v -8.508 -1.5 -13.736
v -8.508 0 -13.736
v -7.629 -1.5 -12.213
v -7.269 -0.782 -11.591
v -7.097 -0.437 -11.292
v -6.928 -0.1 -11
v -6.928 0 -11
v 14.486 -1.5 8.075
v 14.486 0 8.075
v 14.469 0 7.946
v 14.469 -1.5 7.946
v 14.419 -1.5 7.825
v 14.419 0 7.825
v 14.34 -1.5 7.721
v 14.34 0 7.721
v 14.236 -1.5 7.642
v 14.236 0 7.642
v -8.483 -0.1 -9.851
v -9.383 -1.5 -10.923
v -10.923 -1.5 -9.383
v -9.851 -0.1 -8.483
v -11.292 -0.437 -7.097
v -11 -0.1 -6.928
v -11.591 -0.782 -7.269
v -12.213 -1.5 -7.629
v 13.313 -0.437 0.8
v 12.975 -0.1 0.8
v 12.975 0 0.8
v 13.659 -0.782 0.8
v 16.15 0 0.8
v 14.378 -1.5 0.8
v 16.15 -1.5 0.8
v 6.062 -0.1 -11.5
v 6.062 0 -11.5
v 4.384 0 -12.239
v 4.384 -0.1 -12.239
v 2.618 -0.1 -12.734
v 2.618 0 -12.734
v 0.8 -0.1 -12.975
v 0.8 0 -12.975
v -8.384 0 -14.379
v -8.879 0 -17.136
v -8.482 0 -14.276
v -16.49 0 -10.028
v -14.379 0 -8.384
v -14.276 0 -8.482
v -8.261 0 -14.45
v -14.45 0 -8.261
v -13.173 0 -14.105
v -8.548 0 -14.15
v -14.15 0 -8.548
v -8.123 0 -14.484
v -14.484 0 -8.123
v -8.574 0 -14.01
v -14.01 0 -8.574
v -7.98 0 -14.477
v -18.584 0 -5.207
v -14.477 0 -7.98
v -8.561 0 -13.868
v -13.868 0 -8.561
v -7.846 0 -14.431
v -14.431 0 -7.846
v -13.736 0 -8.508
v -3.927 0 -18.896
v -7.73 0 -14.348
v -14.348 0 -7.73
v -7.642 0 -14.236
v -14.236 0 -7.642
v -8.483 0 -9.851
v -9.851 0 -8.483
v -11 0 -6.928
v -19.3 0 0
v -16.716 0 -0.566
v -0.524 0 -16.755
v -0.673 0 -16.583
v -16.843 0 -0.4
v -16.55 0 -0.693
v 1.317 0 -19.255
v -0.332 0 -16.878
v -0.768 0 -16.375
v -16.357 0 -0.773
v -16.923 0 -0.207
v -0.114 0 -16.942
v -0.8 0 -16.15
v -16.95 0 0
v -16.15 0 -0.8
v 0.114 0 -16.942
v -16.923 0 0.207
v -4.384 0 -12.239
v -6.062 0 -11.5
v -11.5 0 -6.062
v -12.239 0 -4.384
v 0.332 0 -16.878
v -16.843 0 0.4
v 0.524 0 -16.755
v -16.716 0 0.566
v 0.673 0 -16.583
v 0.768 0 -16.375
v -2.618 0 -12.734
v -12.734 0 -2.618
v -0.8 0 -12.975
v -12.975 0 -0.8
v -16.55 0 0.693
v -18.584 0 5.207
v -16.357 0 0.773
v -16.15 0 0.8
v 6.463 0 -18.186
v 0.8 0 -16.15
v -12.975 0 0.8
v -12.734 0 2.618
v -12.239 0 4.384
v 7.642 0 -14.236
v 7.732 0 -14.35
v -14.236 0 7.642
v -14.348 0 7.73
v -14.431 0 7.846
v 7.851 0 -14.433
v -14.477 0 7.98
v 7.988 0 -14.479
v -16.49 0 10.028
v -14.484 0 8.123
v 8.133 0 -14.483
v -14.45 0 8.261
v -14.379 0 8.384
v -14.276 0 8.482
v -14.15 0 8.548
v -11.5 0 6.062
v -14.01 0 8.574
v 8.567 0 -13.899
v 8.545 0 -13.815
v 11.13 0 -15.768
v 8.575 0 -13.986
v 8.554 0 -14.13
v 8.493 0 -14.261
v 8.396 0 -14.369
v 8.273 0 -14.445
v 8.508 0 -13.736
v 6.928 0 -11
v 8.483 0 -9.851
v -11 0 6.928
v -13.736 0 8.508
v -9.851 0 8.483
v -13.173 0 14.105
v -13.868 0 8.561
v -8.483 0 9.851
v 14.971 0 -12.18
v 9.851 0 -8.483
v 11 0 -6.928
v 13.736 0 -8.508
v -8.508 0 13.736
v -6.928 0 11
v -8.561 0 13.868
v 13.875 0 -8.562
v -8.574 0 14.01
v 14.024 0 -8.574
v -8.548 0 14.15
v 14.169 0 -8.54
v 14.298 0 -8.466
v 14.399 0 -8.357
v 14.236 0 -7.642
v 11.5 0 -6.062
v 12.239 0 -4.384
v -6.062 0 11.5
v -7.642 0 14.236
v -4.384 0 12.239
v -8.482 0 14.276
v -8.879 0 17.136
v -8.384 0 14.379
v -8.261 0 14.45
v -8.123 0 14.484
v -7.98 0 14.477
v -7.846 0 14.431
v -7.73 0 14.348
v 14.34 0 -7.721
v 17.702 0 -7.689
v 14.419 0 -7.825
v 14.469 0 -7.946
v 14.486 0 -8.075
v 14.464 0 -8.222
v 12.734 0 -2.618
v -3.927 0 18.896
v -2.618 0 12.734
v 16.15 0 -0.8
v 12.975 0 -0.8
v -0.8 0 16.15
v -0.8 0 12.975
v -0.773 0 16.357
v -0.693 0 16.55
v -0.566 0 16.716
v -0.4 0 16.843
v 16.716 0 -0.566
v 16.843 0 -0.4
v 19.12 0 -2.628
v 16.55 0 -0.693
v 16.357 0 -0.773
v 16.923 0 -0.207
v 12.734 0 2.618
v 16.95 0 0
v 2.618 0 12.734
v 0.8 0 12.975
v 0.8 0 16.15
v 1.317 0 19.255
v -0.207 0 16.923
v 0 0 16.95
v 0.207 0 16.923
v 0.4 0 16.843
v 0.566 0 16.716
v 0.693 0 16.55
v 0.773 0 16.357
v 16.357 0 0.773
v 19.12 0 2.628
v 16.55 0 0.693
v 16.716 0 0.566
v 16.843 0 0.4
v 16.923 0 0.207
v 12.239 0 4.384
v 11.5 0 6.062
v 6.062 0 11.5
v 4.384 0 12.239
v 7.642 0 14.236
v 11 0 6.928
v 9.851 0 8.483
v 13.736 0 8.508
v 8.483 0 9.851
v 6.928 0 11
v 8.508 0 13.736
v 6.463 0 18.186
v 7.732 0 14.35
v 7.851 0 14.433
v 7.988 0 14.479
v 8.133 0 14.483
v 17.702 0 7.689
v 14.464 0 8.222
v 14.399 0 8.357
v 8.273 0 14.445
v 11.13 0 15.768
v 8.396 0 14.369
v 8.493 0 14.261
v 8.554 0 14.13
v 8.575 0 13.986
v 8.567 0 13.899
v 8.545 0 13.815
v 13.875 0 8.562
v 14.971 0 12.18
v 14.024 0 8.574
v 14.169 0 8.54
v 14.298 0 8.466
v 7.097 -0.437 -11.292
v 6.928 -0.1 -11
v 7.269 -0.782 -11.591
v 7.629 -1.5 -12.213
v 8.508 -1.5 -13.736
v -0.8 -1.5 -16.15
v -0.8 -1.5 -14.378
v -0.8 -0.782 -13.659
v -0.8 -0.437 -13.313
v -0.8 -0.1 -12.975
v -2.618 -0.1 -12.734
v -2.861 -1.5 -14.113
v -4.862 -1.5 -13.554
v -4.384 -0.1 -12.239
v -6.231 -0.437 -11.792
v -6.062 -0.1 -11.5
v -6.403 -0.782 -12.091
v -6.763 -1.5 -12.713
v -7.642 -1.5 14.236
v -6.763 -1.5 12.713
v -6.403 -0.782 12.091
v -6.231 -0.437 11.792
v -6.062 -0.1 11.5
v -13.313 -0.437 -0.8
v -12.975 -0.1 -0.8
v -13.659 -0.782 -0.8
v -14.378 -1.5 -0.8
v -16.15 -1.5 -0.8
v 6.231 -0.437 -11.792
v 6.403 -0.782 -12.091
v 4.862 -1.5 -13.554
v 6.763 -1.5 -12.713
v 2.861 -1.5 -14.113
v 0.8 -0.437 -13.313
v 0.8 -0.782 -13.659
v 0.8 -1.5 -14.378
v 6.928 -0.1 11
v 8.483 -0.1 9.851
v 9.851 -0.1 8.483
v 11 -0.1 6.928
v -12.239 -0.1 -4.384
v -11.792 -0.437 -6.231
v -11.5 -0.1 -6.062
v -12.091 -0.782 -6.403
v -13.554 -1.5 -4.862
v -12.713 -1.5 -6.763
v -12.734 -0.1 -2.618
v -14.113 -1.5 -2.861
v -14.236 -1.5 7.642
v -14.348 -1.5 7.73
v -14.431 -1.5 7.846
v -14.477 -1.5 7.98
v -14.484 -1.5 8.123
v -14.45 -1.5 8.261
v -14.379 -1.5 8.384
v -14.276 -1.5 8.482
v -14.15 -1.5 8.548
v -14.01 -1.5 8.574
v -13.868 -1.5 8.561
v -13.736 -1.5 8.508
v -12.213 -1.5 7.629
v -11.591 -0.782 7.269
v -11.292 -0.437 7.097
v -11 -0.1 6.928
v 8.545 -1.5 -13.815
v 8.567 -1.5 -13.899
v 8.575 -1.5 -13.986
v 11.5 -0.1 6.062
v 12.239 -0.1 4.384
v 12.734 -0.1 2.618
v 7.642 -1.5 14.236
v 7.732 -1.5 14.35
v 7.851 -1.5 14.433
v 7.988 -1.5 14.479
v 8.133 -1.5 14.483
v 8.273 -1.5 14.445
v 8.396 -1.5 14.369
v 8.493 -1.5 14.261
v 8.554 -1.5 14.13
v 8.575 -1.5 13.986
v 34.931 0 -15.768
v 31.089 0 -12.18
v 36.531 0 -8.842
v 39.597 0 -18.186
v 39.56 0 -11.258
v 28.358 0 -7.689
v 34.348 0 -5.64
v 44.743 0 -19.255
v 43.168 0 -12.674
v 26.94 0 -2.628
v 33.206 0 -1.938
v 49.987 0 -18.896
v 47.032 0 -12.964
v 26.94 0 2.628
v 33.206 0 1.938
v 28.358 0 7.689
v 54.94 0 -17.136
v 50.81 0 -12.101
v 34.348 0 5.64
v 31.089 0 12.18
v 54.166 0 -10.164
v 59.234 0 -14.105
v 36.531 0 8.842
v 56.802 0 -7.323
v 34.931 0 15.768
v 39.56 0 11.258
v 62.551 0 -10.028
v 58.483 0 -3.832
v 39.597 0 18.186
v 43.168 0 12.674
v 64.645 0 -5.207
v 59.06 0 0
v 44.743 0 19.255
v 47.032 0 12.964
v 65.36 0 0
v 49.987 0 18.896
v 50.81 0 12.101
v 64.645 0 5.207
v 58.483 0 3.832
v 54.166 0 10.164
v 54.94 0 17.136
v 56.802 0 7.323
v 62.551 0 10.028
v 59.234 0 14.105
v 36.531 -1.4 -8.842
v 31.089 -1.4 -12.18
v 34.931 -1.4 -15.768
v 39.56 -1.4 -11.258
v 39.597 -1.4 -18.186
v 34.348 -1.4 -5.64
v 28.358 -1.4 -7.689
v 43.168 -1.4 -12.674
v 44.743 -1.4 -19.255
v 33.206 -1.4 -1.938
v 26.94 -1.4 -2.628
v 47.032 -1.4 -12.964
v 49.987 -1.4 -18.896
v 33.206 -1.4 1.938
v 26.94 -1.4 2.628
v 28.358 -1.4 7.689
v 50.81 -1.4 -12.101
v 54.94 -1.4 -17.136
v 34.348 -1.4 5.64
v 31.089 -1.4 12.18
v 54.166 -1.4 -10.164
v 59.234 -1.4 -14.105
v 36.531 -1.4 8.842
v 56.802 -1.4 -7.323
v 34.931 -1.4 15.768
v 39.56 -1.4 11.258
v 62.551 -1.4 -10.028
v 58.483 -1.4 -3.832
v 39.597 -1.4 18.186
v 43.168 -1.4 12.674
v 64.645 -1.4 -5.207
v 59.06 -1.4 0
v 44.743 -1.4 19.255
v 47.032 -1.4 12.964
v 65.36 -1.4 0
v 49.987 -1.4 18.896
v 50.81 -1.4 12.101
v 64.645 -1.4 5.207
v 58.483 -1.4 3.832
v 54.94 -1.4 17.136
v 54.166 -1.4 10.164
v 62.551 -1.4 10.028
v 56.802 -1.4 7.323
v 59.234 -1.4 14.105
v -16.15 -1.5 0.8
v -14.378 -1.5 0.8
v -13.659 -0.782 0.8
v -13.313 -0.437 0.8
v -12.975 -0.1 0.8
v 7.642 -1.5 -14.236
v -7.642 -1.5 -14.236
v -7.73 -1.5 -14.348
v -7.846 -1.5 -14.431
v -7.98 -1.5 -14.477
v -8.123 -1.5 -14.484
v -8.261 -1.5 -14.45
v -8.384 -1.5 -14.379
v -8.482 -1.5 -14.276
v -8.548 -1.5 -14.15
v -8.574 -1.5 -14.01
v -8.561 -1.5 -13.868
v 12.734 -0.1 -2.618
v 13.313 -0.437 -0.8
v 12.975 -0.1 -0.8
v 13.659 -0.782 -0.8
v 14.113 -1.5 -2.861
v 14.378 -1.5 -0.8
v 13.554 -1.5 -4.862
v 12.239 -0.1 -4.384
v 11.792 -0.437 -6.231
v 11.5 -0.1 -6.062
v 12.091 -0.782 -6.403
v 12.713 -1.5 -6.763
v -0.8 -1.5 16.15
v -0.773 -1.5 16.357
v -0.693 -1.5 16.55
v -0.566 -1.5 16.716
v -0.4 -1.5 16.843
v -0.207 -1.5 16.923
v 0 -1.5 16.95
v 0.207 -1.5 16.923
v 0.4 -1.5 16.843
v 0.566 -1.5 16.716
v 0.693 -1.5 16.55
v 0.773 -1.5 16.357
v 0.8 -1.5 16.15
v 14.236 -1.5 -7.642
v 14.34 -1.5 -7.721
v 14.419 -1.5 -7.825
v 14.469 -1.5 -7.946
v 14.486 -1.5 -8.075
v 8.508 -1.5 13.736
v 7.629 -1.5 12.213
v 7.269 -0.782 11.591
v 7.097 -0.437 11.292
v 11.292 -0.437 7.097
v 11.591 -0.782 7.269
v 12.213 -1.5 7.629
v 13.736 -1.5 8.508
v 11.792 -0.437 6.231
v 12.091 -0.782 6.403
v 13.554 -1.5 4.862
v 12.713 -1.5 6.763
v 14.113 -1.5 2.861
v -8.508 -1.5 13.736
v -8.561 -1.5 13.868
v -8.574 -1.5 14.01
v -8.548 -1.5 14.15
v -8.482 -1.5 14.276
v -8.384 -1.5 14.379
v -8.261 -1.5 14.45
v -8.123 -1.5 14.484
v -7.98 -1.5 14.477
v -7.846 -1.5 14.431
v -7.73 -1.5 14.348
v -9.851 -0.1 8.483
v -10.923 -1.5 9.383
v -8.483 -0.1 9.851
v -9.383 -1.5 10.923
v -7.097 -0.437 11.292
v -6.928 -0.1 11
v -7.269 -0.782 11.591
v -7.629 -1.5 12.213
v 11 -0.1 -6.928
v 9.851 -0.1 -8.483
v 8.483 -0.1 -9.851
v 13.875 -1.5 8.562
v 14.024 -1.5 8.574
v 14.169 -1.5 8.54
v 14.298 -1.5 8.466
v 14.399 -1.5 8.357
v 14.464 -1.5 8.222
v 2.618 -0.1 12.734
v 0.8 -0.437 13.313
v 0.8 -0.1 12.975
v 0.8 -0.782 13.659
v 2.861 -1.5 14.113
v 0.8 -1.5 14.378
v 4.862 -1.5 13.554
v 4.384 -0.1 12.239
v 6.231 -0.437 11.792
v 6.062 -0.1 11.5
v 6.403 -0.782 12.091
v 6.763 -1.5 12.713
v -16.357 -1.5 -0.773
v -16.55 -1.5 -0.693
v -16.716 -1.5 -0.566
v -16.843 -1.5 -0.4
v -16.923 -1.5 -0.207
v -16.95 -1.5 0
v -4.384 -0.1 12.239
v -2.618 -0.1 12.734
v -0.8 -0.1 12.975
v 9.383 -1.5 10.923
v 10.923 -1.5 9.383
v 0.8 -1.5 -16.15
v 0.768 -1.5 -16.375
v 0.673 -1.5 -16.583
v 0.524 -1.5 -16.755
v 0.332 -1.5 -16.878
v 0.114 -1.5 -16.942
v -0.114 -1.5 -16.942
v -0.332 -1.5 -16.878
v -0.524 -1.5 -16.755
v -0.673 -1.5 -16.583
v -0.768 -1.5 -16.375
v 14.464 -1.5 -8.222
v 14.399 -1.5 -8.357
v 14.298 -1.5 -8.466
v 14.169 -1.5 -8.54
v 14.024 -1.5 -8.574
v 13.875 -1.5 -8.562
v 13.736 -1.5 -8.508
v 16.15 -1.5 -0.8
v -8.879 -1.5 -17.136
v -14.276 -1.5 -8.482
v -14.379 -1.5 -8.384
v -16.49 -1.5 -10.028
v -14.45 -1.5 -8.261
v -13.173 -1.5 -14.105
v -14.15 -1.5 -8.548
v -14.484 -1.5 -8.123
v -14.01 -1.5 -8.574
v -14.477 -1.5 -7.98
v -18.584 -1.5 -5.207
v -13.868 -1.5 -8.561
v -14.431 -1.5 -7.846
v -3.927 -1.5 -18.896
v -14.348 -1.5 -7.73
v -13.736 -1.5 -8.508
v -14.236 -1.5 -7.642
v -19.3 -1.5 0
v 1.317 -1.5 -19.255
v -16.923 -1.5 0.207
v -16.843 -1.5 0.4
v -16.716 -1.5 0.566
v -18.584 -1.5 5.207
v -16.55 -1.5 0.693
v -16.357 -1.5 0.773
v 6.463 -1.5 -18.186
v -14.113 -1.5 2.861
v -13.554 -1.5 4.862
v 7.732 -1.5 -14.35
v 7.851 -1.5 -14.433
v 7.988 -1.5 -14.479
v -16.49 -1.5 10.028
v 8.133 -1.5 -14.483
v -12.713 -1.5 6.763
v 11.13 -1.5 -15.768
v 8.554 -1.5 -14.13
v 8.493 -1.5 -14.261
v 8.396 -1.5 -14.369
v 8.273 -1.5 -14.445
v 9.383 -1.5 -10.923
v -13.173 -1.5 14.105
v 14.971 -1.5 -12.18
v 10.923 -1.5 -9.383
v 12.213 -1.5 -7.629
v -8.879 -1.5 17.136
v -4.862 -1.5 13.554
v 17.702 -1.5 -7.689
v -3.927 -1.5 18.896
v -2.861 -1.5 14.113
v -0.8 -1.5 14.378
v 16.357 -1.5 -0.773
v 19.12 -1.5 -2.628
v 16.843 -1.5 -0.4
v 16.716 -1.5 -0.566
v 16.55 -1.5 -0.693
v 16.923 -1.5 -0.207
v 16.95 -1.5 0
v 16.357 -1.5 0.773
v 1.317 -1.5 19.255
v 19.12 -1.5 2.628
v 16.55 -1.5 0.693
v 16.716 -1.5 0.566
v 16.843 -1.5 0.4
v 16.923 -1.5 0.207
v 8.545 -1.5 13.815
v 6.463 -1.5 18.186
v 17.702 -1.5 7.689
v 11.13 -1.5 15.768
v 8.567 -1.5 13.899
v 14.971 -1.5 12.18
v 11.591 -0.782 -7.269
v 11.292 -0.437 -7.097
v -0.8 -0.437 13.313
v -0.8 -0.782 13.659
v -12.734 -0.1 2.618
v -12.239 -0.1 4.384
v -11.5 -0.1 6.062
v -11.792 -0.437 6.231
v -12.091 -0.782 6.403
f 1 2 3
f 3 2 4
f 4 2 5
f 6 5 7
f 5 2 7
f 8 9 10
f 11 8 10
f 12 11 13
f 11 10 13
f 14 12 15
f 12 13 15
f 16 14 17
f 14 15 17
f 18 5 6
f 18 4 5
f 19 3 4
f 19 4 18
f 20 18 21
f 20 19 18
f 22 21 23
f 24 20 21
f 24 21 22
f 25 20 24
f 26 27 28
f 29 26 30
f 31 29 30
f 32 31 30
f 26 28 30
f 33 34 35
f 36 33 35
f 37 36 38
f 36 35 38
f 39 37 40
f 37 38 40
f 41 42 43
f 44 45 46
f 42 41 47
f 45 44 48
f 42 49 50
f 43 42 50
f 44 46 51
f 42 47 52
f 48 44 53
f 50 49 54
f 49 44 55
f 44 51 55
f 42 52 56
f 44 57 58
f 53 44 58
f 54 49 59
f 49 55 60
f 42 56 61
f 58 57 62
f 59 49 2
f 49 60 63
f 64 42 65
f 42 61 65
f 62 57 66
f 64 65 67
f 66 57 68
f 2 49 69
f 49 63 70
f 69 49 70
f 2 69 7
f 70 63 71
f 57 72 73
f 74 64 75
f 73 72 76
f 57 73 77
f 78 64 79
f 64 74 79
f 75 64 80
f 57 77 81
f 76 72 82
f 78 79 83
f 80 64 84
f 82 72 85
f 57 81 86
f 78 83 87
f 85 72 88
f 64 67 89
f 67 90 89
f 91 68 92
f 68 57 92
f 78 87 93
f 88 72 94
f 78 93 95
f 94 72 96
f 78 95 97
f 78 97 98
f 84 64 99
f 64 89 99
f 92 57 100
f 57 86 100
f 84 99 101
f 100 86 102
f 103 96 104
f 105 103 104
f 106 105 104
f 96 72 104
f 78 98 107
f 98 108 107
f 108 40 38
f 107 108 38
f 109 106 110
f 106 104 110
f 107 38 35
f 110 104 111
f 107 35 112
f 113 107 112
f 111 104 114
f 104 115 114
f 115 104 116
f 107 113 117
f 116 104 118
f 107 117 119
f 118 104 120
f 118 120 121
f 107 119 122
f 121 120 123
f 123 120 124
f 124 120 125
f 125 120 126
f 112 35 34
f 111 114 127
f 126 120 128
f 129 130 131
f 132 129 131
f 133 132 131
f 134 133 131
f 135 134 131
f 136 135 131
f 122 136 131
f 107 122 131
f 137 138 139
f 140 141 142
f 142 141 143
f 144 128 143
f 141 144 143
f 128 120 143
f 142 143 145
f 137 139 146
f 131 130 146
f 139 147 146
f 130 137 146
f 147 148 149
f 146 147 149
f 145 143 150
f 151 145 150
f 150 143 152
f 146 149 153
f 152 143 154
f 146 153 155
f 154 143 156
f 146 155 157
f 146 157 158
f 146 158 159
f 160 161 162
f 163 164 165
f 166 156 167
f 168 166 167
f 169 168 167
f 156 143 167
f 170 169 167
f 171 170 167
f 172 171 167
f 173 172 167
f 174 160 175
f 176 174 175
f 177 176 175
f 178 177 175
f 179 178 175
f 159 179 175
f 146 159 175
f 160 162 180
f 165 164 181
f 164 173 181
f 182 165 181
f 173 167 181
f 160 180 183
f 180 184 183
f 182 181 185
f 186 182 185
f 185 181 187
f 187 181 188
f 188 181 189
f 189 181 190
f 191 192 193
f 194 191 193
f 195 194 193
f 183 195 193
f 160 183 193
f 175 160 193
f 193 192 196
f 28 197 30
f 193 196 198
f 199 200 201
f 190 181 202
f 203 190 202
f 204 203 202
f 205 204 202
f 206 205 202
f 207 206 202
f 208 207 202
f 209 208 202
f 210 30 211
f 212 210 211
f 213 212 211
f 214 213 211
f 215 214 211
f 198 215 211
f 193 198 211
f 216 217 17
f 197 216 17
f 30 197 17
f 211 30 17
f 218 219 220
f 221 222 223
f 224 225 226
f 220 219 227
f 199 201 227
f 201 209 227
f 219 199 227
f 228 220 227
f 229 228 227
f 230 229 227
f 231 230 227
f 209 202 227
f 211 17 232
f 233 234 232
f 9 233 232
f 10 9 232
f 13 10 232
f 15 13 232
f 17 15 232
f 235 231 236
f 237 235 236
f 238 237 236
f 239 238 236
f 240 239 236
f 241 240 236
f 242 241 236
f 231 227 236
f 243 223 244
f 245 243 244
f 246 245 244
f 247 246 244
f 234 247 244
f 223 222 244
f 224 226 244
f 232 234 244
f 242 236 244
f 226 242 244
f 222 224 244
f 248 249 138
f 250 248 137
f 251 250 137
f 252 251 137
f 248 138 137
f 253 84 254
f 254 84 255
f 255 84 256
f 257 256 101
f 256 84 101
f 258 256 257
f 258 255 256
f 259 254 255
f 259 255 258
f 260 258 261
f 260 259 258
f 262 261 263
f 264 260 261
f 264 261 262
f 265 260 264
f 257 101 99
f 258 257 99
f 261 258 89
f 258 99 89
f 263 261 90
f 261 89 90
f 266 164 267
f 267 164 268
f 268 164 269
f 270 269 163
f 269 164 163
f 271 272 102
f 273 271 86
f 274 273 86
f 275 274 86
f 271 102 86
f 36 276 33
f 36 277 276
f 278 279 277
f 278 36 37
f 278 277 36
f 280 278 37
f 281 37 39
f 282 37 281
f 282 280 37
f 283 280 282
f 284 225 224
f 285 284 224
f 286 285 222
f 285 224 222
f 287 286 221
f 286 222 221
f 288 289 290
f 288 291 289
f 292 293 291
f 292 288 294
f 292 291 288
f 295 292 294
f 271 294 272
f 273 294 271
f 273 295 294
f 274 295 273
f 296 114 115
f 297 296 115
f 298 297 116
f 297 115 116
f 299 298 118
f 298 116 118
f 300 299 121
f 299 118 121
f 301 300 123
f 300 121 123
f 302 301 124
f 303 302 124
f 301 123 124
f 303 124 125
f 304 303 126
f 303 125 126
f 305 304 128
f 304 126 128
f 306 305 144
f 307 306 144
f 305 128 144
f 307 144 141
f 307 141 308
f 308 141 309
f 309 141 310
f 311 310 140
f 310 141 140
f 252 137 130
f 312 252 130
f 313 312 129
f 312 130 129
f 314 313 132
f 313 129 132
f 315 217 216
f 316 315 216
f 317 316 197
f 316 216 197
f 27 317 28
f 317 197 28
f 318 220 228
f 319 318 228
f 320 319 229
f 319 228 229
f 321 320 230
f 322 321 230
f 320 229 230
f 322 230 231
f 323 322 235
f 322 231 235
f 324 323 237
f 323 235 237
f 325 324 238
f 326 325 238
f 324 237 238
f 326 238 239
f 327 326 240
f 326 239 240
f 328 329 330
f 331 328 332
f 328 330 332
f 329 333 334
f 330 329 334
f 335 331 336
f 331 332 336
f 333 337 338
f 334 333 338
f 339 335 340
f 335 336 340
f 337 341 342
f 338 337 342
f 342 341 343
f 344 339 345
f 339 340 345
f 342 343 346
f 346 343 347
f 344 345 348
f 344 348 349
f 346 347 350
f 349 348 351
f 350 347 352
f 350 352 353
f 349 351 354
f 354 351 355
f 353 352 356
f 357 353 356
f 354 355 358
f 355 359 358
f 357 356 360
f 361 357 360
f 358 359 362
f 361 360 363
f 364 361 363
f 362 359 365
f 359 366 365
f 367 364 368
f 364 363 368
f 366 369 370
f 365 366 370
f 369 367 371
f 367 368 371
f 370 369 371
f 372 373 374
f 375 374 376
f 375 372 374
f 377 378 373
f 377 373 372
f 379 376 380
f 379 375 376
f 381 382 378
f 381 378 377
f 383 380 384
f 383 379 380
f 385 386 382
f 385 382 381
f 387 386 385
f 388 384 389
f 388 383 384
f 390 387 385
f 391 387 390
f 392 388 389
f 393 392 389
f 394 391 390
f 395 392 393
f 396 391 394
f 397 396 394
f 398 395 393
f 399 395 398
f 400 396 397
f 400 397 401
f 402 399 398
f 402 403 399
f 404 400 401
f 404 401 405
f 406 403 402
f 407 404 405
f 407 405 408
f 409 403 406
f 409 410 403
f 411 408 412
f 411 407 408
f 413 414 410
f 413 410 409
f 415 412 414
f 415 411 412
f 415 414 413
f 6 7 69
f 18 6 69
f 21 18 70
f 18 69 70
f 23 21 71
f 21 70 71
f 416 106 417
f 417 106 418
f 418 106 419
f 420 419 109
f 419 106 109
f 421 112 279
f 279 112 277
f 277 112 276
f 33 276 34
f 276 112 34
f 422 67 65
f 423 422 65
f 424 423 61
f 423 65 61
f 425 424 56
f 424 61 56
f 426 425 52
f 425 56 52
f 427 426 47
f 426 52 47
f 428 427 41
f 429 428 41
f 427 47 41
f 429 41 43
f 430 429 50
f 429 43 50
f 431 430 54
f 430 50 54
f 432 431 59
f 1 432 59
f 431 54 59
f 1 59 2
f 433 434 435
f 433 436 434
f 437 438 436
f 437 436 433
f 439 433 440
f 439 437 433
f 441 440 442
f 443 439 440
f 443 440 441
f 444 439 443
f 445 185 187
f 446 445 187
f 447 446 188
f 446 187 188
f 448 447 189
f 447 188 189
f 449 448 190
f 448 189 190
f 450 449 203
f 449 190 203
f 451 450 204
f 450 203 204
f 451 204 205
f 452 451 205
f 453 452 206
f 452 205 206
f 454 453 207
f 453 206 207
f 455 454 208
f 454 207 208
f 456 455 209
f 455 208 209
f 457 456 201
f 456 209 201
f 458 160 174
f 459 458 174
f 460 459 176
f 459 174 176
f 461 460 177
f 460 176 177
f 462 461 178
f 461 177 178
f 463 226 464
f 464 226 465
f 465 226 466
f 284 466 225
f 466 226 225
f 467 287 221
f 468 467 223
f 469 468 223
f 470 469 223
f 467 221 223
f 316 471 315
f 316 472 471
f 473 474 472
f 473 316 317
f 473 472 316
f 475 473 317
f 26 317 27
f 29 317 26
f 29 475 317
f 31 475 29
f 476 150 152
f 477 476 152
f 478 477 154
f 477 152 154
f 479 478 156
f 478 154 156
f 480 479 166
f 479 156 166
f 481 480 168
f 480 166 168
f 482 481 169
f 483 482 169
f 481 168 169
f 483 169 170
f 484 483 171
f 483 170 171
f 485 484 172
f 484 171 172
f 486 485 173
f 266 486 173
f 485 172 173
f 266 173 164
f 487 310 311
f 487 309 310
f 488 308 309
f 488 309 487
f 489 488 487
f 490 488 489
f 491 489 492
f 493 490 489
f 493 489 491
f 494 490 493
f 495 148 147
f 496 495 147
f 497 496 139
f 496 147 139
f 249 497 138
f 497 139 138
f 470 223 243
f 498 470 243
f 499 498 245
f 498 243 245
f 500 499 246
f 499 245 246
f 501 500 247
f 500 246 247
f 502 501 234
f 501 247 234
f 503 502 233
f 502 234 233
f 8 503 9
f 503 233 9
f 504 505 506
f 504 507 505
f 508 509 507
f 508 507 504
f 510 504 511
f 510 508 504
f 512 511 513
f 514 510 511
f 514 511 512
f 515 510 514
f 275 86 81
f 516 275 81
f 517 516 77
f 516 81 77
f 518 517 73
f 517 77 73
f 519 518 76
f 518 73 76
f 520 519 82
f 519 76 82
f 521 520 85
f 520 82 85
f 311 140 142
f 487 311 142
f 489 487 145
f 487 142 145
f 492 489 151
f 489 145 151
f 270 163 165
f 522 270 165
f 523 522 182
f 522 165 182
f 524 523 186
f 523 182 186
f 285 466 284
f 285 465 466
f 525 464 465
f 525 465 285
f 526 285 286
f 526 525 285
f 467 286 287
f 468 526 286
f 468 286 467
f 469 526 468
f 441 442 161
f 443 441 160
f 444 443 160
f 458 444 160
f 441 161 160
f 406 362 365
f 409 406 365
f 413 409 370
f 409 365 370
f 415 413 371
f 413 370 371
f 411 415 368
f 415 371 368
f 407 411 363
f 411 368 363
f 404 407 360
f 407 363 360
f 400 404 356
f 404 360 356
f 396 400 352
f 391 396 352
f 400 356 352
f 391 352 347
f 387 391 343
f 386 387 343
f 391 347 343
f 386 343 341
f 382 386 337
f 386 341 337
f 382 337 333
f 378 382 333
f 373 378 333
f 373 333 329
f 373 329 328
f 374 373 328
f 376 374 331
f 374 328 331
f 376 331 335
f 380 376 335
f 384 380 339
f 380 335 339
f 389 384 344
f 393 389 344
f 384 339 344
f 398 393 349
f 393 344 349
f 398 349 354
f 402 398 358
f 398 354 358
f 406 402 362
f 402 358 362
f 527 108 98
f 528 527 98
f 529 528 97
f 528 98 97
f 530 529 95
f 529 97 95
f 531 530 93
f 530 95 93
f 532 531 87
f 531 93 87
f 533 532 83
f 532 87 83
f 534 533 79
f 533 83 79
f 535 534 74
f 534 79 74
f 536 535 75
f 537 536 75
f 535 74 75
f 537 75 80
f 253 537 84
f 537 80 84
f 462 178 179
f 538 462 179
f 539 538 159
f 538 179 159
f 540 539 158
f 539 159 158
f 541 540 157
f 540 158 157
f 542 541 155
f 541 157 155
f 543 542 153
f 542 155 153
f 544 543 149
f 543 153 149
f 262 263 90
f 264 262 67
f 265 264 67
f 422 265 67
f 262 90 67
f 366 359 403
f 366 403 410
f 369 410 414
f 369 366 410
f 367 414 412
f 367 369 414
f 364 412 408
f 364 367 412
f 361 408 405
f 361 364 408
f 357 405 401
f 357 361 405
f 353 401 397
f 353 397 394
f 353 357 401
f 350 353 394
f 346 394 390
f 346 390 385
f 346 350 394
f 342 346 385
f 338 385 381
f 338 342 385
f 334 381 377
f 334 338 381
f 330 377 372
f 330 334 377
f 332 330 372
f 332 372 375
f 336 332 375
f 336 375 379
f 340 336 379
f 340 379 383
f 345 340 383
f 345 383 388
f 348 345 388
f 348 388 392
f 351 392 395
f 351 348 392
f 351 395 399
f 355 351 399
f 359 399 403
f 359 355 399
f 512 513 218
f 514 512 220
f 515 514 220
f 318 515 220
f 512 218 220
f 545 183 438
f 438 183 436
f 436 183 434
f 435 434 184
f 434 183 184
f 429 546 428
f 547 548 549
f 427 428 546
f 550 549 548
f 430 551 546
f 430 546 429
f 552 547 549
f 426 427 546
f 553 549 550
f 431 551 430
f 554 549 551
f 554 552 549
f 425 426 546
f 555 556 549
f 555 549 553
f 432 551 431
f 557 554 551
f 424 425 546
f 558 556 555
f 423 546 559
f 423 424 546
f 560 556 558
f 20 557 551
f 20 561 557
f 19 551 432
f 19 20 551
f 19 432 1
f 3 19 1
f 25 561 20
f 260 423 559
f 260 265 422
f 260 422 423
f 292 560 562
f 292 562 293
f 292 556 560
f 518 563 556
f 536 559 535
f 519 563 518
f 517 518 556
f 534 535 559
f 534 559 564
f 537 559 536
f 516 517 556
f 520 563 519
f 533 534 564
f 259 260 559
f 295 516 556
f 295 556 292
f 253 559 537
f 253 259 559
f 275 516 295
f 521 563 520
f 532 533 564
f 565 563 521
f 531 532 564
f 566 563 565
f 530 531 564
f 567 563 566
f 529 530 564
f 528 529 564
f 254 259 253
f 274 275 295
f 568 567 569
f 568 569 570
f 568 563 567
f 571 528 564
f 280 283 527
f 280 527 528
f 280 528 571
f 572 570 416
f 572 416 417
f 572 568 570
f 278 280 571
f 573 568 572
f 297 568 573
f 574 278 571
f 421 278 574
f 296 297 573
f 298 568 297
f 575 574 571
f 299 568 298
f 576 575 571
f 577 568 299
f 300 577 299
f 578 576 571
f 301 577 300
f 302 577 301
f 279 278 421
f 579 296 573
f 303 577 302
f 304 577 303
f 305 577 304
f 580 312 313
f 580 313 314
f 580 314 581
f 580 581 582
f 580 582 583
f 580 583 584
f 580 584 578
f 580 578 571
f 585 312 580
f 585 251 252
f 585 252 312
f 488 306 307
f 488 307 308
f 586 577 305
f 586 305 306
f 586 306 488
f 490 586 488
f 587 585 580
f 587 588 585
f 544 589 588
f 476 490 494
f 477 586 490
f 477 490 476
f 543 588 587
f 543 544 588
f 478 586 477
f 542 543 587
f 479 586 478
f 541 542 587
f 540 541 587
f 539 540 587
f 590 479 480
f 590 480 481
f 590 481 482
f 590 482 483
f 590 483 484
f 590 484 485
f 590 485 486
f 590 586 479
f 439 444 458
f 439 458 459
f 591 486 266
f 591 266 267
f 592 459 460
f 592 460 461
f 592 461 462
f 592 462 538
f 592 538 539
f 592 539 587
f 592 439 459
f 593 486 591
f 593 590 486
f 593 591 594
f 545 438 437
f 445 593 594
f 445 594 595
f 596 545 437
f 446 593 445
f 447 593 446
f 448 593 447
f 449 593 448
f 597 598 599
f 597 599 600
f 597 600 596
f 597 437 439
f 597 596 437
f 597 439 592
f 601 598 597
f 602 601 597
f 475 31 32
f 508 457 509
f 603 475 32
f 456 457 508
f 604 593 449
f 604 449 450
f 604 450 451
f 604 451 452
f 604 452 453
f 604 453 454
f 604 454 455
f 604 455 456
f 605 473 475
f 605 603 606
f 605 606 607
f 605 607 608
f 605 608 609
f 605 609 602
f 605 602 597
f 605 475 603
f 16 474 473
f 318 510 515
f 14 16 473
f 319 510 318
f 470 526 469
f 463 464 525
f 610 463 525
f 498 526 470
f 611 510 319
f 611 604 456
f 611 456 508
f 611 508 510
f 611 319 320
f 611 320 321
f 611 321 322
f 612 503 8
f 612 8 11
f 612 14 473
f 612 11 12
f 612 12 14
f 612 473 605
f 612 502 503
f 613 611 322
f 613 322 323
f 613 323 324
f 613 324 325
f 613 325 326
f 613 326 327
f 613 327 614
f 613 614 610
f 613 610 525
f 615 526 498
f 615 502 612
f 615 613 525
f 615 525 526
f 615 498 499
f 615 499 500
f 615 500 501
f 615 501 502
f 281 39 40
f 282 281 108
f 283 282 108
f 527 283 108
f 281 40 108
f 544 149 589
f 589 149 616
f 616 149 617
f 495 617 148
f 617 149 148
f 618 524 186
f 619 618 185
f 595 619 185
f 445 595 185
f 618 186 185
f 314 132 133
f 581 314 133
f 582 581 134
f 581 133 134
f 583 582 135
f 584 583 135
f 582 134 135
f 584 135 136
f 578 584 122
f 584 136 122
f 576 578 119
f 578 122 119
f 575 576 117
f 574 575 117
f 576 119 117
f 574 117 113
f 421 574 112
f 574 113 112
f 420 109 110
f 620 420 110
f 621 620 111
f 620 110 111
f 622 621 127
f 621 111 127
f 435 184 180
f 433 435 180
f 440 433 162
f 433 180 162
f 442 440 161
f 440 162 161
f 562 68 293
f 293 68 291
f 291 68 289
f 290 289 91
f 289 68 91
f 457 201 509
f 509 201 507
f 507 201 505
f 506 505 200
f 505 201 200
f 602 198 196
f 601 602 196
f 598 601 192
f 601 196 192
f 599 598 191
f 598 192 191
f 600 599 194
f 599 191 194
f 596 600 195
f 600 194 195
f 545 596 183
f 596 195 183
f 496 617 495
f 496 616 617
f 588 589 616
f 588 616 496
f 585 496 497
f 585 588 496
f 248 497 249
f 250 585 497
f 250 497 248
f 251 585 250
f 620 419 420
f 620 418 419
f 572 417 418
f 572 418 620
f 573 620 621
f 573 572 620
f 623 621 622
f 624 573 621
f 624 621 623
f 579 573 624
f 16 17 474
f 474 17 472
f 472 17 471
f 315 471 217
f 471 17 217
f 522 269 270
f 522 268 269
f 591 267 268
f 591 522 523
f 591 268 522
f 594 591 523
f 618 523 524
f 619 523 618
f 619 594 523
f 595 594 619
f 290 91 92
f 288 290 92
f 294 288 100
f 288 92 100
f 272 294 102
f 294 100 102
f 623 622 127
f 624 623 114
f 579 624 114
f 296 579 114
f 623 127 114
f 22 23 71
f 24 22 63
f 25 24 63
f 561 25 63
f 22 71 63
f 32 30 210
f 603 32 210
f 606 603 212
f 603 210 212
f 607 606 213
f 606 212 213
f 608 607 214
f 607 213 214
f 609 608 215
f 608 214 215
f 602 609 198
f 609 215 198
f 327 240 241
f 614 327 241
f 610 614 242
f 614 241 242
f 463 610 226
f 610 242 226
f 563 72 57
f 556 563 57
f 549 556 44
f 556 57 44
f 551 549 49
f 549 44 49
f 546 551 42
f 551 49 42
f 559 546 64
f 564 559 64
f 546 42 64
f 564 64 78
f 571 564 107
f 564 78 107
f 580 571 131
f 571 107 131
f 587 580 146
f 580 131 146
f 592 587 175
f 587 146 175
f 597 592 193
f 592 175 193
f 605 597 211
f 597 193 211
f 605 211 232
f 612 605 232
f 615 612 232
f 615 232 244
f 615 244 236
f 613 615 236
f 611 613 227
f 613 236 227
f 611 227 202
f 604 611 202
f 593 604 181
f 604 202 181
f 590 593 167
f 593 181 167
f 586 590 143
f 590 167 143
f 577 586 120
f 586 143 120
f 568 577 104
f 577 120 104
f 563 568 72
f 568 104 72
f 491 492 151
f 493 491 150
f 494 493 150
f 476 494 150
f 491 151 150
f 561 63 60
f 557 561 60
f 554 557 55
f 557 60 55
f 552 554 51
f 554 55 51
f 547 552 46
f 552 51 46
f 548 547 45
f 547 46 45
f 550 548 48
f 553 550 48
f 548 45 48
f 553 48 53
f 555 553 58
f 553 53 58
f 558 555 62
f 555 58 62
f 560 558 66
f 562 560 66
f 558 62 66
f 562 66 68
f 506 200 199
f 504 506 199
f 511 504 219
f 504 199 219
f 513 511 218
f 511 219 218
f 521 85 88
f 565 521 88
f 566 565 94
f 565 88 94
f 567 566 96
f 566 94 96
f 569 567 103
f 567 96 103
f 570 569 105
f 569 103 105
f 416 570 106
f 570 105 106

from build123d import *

# Parameters (mm, degrees)
F1_DEPTH = 1.5
F2_SIZE  = 1.4
F0_R     = 19.3
F0_R_2   = 13
F3_DEPTH = 1.4


with BuildPart() as f1:
    # F0 (on Front) → F1 (new body)
    with BuildSketch(Plane.XZ):
        with BuildLine():
            Line((0, 16.95), (0, 19.3))
            ThreePointArc((0, 19.3), (-13.6471608769, 13.6471608769), (-19.3, 0))
            Line((-19.3, 0), (-16.95, 0))
            ThreePointArc((-16.95, 0), (-16.7156854249, 0.5656854249), (-16.15, 0.8))
            Line((-16.15, 0.8), (-12.9753612666, 0.8))
            ThreePointArc((-12.9753612666, 0.8), (-12.5173262382, 3.509493389), (-11.5, 6.0621778265))
            Line((-11.5, 6.0621778265), (-14.2363102711, 7.6419872981))
            ThreePointArc((-14.2363102711, 7.6419872981), (-14.419322973, 8.325), (-13.7363102711, 8.5080127019))
            Line((-13.7363102711, 8.5080127019), (-11, 6.9282032303))
            ThreePointArc((-11, 6.9282032303), (-9.1923881554, 9.1923881554), (-6.9282032303, 11))
            Line((-6.9282032303, 11), (-8.5080127019, 13.7363102711))
            ThreePointArc((-8.5080127019, 13.7363102711), (-8.325, 14.419322973), (-7.6419872981, 14.2363102711))
            Line((-7.6419872981, 14.2363102711), (-6.0621778265, 11.5))
            ThreePointArc((-6.0621778265, 11.5), (-3.509493389, 12.5173262382), (-0.8, 12.9753612666))
            Line((-0.8, 12.9753612666), (-0.8, 16.15))
            ThreePointArc((-0.8, 16.15), (-0.5656854249, 16.7156854249), (0, 16.95))
        make_face()
        with BuildLine():
            ThreePointArc((-19.3, 0), (0, -19.3), (19.3, 0))
            ThreePointArc((19.3, 0), (13.6471608769, 13.6471608769), (0, 19.3))
            Line((0, 19.3), (0, 16.95))
            ThreePointArc((0, 16.95), (0.5656854249, 16.7156854249), (0.8, 16.15))
            Line((0.8, 16.15), (0.8, 12.9753612666))
            ThreePointArc((0.8, 12.9753612666), (3.509493389, 12.5173262382), (6.0621778265, 11.5))
            Line((6.0621778265, 11.5), (7.6419872981, 14.2363102711))
            ThreePointArc((7.6419872981, 14.2363102711), (8.2044095226, 14.4692731843), (8.575, 13.9863102711))
            ThreePointArc((8.575, 13.9863102711), (8.5579629131, 13.8569007486), (8.5080127019, 13.7363102711))
            Line((8.5080127019, 13.7363102711), (6.9282032303, 11))
            ThreePointArc((6.9282032303, 11), (9.1923881554, 9.1923881554), (11, 6.9282032303))
            Line((11, 6.9282032303), (13.7363102711, 8.5080127019))
            ThreePointArc((13.7363102711, 8.5080127019), (14.2363102711, 8.5080127019), (14.4863102711, 8.075))
            ThreePointArc((14.4863102711, 8.075), (14.419322973, 7.825), (14.2363102711, 7.6419872981))
            Line((14.2363102711, 7.6419872981), (11.5, 6.0621778265))
            ThreePointArc((11.5, 6.0621778265), (12.5173262382, 3.509493389), (12.9753612666, 0.8))
            Line((12.9753612666, 0.8), (16.15, 0.8))
            ThreePointArc((16.15, 0.8), (16.7156854249, 0.5656854249), (16.95, 0))
            ThreePointArc((16.95, 0), (16.7156854249, -0.5656854249), (16.15, -0.8))
            Line((16.15, -0.8), (12.9753612666, -0.8))
            ThreePointArc((12.9753612666, -0.8), (12.5173262382, -3.509493389), (11.5, -6.0621778265))
            Line((11.5, -6.0621778265), (14.2363102711, -7.6419872981))
            ThreePointArc((14.2363102711, -7.6419872981), (14.419322973, -7.825), (14.4863102711, -8.075))
            ThreePointArc((14.4863102711, -8.075), (14.2363102711, -8.5080127019), (13.7363102711, -8.5080127019))
            Line((13.7363102711, -8.5080127019), (11, -6.9282032303))
            ThreePointArc((11, -6.9282032303), (9.1923881554, -9.1923881554), (6.9282032303, -11))
            Line((6.9282032303, -11), (8.5080127019, -13.7363102711))
            ThreePointArc((8.5080127019, -13.7363102711), (8.5579629131, -13.8569007486), (8.575, -13.9863102711))
            ThreePointArc((8.575, -13.9863102711), (8.2044095226, -14.4692731843), (7.6419872981, -14.2363102711))
            Line((7.6419872981, -14.2363102711), (6.0621778265, -11.5))
            ThreePointArc((6.0621778265, -11.5), (3.509493389, -12.5173262382), (0.8, -12.9753612666))
            Line((0.8, -12.9753612666), (0.8, -16.15))
            ThreePointArc((0.8, -16.15), (0, -16.95), (-0.8, -16.15))
            Line((-0.8, -16.15), (-0.8, -12.9753612666))
            ThreePointArc((-0.8, -12.9753612666), (-3.509493389, -12.5173262382), (-6.0621778265, -11.5))
            Line((-6.0621778265, -11.5), (-7.6419872981, -14.2363102711))
            ThreePointArc((-7.6419872981, -14.2363102711), (-8.325, -14.419322973), (-8.5080127019, -13.7363102711))
            Line((-8.5080127019, -13.7363102711), (-6.9282032303, -11))
            ThreePointArc((-6.9282032303, -11), (-9.1923881554, -9.1923881554), (-11, -6.9282032303))
            Line((-11, -6.9282032303), (-13.7363102711, -8.5080127019))
            ThreePointArc((-13.7363102711, -8.5080127019), (-14.419322973, -8.325), (-14.2363102711, -7.6419872981))
            Line((-14.2363102711, -7.6419872981), (-11.5, -6.0621778265))
            ThreePointArc((-11.5, -6.0621778265), (-12.5173262382, -3.509493389), (-12.9753612666, -0.8))
            Line((-12.9753612666, -0.8), (-16.15, -0.8))
            ThreePointArc((-16.15, -0.8), (-16.7156854249, -0.5656854249), (-16.95, 0))
            Line((-16.95, 0), (-19.3, 0))
        make_face()
    extrude(amount=F1_DEPTH)

    # F2
    f2_edges = [f1.edges().sort_by_distance(p)[0] for p in [
        (-12.517326, -1.5, 3.509493),
        (-9.192388, -1.5, 9.192388),
        (-3.509493, -1.5, 12.517326),
        (3.509493, -1.5, 12.517326),
        (9.192388, -1.5, 9.192388),
        (12.517326, -1.5, 3.509493),
        (12.517326, -1.5, -3.509493),
        (9.192388, -1.5, -9.192388),
        (3.509493, -1.5, -12.517326),
        (-3.509493, -1.5, -12.517326),
        (-9.192388, -1.5, -9.192388),
        (-12.517326, -1.5, -3.509493),
    ]]
    chamfer(f2_edges, length=F2_SIZE)


with BuildPart() as f3:
    # F0 (on Front) → F3 (new body)
    with BuildSketch(Plane.XZ):
        with Locations((46.060487628, 0)):
            Circle(F0_R)
        with Locations((46.060487628, 0)):
            Circle(F0_R_2, mode=Mode.SUBTRACT)
    extrude(amount=F3_DEPTH)


solid = Compound([f1.part, f3.part])
